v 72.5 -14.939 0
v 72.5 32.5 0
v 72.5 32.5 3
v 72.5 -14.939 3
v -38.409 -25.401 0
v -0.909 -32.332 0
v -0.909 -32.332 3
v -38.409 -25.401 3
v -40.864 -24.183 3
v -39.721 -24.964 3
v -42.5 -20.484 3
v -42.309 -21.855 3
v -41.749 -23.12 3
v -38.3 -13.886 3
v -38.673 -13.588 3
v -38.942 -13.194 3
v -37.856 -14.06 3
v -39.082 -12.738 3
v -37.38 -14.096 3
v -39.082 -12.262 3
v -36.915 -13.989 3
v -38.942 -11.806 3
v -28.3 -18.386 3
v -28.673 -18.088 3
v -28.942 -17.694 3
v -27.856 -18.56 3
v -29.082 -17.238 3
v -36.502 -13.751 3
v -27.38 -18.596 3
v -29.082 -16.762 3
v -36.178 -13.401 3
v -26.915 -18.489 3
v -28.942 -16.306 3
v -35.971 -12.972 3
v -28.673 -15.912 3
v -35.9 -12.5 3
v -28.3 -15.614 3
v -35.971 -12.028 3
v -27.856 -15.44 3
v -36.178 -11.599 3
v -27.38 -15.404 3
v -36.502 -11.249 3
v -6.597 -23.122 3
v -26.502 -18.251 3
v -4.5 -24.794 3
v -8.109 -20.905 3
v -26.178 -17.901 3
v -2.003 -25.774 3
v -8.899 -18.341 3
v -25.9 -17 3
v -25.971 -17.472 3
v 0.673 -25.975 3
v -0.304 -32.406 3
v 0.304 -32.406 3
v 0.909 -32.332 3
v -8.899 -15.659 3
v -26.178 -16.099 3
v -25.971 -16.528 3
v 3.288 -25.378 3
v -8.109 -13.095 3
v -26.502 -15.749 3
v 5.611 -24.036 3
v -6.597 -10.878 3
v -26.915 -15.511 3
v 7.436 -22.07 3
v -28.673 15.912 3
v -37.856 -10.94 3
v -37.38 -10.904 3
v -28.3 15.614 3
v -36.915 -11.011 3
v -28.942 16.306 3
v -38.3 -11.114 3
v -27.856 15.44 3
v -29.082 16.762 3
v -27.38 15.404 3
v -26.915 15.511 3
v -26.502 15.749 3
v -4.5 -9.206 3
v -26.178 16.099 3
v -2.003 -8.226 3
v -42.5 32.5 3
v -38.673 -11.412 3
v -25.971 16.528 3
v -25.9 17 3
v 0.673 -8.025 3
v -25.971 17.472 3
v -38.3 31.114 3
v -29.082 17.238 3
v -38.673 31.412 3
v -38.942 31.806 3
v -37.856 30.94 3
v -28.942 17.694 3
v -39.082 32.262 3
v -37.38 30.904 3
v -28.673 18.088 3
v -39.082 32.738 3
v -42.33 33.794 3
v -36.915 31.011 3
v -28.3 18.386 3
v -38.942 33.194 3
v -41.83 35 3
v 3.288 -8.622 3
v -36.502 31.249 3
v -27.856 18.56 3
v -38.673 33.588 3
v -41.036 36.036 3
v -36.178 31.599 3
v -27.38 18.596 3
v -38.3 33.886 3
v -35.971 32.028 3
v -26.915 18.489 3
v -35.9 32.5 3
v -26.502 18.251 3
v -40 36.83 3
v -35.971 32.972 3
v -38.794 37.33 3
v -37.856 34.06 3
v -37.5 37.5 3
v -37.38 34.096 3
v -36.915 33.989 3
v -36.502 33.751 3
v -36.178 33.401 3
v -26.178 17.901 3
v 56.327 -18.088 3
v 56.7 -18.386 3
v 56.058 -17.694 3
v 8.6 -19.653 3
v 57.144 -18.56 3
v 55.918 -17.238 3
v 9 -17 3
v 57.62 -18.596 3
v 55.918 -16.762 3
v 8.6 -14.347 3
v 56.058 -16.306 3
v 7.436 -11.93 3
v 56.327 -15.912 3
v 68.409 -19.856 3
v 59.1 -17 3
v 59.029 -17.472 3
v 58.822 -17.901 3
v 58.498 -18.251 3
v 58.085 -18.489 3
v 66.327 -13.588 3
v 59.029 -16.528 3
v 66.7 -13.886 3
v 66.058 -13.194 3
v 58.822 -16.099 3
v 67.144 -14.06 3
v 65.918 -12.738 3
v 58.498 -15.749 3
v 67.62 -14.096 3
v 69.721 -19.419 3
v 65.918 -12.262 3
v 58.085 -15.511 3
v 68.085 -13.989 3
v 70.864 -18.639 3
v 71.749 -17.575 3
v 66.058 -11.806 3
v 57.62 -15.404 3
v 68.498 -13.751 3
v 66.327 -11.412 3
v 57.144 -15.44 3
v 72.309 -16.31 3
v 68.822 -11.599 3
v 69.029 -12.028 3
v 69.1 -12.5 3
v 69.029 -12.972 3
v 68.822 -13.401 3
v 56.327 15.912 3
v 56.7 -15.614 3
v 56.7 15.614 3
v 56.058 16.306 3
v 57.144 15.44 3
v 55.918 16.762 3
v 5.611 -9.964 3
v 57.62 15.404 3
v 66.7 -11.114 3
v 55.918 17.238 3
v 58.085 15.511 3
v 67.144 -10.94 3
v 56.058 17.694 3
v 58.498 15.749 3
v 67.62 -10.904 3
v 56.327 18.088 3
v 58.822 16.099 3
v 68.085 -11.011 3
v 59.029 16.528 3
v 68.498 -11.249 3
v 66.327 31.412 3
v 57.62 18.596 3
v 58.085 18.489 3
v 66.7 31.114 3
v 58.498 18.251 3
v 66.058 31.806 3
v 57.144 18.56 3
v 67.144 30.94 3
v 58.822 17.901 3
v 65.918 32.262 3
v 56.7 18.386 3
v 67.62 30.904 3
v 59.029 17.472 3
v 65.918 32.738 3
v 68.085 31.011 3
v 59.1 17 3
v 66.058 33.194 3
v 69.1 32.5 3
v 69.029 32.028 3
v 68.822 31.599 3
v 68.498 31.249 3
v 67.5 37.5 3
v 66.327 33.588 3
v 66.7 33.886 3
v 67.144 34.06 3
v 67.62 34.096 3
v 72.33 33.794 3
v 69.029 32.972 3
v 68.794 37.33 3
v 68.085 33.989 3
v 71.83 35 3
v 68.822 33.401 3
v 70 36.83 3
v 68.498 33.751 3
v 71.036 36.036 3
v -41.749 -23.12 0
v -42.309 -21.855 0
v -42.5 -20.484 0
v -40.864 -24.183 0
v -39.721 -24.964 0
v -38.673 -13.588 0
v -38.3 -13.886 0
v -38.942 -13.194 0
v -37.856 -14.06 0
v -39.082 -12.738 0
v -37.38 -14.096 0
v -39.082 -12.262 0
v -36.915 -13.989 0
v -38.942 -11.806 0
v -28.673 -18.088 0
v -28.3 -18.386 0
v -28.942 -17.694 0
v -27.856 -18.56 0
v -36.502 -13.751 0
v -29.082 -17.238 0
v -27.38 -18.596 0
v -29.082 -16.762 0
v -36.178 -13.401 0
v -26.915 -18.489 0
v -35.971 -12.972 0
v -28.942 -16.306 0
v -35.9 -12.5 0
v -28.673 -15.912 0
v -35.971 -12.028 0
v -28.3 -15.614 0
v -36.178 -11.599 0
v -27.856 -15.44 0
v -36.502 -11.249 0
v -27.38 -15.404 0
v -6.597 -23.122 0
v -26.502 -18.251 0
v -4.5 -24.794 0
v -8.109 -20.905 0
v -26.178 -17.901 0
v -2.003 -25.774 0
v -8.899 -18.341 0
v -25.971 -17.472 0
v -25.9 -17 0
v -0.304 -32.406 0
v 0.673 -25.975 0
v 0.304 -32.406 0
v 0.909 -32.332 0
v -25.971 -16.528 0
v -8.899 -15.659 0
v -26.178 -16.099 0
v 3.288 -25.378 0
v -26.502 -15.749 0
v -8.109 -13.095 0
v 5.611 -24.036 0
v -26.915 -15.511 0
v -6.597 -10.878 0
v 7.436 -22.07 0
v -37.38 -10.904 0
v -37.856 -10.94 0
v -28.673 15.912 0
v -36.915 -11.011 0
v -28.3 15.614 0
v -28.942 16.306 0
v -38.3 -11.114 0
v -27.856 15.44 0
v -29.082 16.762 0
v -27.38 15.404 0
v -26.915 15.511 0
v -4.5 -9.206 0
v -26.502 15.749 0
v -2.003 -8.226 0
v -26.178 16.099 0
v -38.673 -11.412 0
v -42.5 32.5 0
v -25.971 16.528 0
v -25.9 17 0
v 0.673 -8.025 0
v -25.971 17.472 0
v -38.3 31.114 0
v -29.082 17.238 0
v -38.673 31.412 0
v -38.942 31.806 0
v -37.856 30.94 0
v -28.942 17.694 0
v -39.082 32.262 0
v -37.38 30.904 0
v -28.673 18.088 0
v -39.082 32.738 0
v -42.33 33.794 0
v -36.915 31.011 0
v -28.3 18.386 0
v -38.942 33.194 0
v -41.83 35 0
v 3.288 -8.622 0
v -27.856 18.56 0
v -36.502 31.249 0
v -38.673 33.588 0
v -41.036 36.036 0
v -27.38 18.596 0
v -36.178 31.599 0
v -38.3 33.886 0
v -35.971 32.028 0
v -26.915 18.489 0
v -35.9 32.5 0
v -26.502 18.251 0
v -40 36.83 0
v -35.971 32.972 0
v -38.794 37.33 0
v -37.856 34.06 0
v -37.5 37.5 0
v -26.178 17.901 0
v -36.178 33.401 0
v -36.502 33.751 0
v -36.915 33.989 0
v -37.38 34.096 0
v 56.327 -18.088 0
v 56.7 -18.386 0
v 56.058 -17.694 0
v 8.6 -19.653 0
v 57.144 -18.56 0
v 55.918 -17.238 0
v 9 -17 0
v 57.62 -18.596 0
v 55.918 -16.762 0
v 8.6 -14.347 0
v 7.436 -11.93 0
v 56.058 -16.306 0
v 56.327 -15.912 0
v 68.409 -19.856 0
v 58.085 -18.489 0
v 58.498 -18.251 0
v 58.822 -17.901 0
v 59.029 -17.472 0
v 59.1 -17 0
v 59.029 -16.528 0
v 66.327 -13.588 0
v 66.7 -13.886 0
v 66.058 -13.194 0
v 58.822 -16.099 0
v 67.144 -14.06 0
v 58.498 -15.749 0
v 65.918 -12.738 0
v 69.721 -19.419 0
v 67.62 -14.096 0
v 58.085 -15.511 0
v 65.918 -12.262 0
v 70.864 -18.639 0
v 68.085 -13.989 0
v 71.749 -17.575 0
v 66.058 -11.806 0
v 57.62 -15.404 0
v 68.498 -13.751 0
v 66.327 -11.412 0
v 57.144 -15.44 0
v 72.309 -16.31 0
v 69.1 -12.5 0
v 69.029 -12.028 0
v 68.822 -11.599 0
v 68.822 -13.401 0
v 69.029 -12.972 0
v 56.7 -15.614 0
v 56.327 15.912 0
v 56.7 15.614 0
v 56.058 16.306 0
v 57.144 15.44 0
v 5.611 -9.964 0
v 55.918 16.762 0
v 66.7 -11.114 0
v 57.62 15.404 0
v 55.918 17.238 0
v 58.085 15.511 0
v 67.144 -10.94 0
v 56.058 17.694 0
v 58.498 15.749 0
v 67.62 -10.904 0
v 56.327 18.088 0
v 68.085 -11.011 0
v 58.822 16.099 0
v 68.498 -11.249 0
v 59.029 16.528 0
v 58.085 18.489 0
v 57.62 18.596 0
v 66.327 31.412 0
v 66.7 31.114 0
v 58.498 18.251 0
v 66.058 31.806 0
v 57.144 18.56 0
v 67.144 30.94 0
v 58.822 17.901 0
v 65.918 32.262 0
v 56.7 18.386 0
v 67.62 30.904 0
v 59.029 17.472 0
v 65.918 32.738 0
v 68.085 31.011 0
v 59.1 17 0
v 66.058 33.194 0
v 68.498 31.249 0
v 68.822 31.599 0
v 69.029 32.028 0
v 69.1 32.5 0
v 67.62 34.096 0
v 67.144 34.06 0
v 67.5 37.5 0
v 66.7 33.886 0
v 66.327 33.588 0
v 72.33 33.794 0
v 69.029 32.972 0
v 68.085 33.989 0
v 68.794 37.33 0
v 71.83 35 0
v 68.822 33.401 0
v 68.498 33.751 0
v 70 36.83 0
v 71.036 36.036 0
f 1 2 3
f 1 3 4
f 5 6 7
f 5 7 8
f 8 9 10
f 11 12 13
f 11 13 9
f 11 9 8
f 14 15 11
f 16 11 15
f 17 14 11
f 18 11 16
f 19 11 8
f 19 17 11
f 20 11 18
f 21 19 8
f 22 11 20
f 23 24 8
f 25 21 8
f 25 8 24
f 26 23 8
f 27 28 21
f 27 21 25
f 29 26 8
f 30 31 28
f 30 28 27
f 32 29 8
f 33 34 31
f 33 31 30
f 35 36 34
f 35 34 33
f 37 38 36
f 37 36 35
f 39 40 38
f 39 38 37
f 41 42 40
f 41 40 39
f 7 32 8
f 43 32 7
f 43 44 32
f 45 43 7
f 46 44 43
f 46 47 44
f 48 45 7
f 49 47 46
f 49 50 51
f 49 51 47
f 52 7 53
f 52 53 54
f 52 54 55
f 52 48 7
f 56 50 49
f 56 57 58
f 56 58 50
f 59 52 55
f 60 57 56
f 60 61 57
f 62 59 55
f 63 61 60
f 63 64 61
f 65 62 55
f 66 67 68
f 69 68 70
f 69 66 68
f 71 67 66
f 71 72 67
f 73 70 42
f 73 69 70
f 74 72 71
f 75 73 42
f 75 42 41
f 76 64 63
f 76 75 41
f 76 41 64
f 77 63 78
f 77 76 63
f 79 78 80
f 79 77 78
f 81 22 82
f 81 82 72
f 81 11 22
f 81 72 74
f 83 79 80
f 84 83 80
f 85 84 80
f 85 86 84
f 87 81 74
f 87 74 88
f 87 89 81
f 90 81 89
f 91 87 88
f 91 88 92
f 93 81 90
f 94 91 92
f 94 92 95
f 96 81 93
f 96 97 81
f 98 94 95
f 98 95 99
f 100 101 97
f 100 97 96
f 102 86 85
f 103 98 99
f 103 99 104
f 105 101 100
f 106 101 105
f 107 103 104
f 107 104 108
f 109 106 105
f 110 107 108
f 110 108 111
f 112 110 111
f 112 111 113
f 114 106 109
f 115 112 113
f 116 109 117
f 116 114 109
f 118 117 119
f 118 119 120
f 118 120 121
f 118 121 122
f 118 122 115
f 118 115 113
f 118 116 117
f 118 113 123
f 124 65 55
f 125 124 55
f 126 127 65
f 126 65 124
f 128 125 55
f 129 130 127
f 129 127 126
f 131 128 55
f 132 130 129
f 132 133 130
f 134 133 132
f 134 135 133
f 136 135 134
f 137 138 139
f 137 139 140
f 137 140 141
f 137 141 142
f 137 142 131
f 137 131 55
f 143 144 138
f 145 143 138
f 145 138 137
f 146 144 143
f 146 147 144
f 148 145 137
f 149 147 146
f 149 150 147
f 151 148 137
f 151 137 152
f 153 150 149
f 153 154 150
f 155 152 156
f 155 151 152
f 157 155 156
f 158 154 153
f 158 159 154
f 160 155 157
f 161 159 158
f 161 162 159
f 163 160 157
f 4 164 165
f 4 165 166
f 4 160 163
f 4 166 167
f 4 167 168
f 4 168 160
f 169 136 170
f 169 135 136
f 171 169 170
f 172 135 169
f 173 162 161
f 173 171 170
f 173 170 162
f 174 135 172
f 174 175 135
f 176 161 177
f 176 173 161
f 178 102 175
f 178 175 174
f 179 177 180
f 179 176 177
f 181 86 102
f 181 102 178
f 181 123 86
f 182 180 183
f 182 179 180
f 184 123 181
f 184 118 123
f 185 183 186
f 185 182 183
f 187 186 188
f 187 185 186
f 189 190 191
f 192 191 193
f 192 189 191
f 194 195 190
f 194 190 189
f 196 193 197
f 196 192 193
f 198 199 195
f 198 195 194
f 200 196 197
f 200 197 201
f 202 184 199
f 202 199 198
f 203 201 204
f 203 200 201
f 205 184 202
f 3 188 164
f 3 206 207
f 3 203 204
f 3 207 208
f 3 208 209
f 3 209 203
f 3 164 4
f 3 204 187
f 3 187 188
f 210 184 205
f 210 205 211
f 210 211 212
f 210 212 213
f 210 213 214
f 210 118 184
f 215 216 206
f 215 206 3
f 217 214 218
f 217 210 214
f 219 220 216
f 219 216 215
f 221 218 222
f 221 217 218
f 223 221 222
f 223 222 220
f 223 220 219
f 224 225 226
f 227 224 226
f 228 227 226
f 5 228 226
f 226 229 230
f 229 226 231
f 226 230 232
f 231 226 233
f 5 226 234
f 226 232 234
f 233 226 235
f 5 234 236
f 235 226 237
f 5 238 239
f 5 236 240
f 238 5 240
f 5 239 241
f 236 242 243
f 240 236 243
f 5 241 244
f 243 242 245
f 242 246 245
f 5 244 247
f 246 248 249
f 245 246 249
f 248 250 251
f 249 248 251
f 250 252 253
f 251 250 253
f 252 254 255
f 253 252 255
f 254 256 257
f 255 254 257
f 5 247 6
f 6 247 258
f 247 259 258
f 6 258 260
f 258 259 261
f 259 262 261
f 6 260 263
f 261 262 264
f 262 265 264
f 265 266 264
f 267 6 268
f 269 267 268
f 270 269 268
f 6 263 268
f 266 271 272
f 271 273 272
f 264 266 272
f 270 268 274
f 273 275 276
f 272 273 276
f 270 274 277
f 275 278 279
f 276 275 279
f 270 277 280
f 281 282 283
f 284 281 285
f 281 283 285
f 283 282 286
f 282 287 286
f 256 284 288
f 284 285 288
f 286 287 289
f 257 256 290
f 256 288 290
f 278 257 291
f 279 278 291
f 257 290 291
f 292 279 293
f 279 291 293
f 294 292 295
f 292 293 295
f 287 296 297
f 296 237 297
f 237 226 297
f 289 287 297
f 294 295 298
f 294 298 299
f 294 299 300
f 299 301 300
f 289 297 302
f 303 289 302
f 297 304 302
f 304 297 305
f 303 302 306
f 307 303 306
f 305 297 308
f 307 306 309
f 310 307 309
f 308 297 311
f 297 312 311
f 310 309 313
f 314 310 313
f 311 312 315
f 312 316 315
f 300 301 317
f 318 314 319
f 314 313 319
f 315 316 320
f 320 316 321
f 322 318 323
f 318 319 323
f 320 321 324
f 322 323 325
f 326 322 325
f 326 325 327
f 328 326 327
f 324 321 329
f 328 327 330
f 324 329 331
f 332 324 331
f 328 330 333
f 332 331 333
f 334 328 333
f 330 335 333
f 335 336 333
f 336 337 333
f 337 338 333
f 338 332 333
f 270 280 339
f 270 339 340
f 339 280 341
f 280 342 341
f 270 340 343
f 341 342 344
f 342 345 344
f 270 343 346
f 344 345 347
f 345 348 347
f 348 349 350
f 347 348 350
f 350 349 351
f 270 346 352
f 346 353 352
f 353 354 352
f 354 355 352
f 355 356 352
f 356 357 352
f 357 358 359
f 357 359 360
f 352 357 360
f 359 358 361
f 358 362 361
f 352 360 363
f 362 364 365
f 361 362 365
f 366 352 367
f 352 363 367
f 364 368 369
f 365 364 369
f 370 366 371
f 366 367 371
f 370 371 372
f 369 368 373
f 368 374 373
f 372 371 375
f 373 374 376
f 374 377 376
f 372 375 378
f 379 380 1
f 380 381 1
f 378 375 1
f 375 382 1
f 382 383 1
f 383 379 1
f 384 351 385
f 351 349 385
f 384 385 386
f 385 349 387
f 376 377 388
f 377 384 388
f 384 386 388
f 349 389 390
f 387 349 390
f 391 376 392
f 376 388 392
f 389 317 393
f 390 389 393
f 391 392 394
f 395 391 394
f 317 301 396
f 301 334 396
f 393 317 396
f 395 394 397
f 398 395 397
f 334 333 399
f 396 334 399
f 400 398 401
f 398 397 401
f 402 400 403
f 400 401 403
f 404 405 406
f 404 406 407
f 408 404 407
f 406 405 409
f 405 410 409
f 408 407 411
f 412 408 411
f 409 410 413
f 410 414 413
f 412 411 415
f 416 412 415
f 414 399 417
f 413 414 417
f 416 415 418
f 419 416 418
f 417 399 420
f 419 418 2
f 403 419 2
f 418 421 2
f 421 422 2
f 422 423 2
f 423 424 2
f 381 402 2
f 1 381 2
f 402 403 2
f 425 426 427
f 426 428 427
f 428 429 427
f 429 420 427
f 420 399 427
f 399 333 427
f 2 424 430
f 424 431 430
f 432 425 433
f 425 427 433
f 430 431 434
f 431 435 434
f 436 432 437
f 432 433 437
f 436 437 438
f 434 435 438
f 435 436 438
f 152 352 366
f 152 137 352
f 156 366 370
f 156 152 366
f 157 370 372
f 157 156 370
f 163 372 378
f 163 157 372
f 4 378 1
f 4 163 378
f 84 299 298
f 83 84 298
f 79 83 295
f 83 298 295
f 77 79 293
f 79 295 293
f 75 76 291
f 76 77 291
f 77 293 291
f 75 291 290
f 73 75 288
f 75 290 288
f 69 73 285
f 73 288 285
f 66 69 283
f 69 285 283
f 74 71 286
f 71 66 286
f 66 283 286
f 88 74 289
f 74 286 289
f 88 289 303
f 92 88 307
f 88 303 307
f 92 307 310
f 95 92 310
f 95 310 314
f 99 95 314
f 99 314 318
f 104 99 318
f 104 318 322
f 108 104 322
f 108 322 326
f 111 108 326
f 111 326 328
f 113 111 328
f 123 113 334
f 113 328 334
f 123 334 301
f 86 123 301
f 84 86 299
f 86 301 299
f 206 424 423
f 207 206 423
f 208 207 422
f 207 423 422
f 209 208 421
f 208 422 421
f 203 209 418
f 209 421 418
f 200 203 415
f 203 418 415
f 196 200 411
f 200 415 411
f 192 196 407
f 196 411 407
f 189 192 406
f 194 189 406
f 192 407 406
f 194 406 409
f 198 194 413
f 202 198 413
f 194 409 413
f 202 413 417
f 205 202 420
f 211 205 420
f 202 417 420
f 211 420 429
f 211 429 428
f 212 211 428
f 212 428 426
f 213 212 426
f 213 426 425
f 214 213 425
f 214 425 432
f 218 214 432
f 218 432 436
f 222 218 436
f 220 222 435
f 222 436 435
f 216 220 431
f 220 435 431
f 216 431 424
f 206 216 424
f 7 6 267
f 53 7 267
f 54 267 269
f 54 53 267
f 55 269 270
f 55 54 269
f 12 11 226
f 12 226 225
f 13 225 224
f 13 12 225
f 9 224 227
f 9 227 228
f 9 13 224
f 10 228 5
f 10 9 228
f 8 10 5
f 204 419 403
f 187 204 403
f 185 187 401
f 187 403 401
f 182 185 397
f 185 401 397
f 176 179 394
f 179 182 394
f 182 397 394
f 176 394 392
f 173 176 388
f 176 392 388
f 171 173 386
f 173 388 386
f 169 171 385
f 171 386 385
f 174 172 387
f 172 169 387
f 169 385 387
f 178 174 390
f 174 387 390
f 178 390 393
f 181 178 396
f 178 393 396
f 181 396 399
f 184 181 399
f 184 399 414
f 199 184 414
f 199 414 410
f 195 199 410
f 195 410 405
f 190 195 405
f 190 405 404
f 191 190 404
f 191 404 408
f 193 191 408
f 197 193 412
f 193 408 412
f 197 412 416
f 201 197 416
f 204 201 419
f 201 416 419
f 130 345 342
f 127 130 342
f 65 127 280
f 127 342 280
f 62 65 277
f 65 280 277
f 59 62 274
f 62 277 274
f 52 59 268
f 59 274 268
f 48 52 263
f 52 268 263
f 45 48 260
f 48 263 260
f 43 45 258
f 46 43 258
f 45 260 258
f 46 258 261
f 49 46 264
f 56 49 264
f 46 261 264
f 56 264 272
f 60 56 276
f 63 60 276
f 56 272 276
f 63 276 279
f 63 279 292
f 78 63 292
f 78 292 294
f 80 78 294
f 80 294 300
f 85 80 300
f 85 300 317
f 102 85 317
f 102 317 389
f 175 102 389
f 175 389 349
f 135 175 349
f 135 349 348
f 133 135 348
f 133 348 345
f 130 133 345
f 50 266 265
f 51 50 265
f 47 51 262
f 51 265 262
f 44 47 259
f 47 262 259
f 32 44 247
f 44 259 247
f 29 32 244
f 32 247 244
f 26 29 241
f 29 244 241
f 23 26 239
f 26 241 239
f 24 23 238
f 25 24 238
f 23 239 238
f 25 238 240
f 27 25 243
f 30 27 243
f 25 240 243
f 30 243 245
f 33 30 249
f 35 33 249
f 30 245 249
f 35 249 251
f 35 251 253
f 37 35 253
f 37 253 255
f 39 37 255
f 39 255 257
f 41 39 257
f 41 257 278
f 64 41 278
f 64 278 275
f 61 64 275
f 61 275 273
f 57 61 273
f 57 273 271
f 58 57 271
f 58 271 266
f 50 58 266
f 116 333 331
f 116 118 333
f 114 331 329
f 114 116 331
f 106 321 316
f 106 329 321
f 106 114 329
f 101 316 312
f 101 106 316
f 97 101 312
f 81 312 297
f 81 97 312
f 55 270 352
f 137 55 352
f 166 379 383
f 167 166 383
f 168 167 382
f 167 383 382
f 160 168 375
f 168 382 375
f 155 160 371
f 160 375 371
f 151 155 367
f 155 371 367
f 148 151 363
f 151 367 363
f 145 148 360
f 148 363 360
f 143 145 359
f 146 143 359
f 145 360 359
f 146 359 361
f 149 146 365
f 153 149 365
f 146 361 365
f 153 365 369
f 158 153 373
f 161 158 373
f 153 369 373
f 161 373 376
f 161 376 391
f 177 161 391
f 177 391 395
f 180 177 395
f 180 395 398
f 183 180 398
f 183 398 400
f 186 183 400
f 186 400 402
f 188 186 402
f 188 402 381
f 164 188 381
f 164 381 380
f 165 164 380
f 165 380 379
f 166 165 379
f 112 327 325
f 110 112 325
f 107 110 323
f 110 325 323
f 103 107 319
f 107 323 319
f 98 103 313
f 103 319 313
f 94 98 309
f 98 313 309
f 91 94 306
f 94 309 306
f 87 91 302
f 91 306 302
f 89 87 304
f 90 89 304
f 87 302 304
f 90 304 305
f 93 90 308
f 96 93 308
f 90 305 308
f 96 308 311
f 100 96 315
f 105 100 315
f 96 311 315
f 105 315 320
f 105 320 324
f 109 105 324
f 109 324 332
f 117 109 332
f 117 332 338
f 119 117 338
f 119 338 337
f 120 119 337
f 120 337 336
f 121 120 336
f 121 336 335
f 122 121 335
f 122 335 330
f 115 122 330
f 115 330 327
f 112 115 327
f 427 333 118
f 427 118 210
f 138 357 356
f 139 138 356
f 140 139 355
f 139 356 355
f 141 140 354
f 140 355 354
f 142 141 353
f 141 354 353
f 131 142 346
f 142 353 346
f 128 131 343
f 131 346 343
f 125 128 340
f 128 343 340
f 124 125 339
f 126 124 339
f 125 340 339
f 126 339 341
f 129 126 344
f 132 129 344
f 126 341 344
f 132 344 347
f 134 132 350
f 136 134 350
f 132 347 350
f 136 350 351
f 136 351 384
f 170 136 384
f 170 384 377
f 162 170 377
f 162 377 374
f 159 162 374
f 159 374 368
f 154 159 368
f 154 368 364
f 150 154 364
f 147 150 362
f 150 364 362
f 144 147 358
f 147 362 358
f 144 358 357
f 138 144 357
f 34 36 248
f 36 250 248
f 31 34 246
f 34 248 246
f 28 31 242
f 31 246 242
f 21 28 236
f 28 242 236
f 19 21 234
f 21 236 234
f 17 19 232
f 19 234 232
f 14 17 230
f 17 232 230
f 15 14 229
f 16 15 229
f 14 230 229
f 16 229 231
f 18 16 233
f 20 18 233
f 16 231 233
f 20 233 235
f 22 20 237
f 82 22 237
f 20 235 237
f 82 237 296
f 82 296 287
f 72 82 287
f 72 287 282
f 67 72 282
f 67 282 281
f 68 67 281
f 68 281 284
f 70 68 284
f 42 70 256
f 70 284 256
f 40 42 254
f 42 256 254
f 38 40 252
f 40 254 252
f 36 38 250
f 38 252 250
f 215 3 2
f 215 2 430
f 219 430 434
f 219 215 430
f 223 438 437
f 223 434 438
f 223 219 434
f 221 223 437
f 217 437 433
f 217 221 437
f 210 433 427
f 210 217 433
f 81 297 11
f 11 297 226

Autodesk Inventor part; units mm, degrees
ref_plane "YZ Plane" through (0, 0, 0) normal (1, 0, 0) x (0, 1, 0)
ref_plane "XZ Plane" through (0, 0, 0) normal (0, 1, 0) x (-1, 0, 0)
ref_plane "XY Plane" through (0, 0, 0) normal (0, 0, 1) x (1, 0, 0)
sketch "スケッチ1" plane through (0, 0, 0) normal (0, 0, 1) x (1, 0, 0)
  point P0 (0, 0)
sketch "スケッチ2" plane through (0, 0, 0) normal (0, 0, 1) x (1, 0, 0)
  line L0 (72.5, -37.5) -> (-72.5, -37.5)
  line L1 (-72.5, -37.5) -> (-72.5, 37.5)
  line L2 (-72.5, 37.5) -> (72.5, 37.5)
  line L3 (72.5, 37.5) -> (72.5, -37.5)
  line L4 (72.5, -37.5) -> (-72.5, 37.5) construction
  line L5 (-72.5, -37.5) -> (72.5, 37.5) construction
  line L6 (67.5, 32.5) -> (-67.5, 32.5)
  line L7 (-67.5, 32.5) -> (-67.5, -32.5)
  line L8 (-67.5, -32.5) -> (67.5, -32.5)
  line L9 (67.5, -32.5) -> (67.5, 32.5)
  line L10 (-67.5, 32.5) -> (-67.5, 12.5) construction
  line L11 (-69.1, 32.5) -> (-69.1, 12.5)
  line L12 (-65.9, 12.5) -> (-65.9, 32.5)
  arc A0 (-65.9, 32.5) -> (-69.1, 32.5) centre (-67.5, 32.5) ccw
  arc A1 (-69.1, 12.5) -> (-65.9, 12.5) centre (-67.5, 12.5) ccw
  line L13 (-67.5, 32.5) -> (-47.5, 32.5) construction
  line L14 (-67.5, -32.5) -> (-67.5, -12.5) construction
  line L15 (-65.9, -32.5) -> (-65.9, -12.5)
  line L16 (-69.1, -12.5) -> (-69.1, -32.5)
  arc A2 (-69.1, -32.5) -> (-65.9, -32.5) centre (-67.5, -32.5) ccw
  arc A3 (-65.9, -12.5) -> (-69.1, -12.5) centre (-67.5, -12.5) ccw
  line L17 (-67.5, -32.5) -> (-47.5, -32.5) construction
  line L18 (67.5, 32.5) -> (67.5, 12.5) construction
  line L19 (65.9, 32.5) -> (65.9, 12.5)
  line L20 (69.1, 12.5) -> (69.1, 32.5)
  arc A4 (69.1, 32.5) -> (65.9, 32.5) centre (67.5, 32.5) ccw
  arc A5 (65.9, 12.5) -> (69.1, 12.5) centre (67.5, 12.5) ccw
  line L21 (67.5, 32.5) -> (87.5, 32.5) construction
  line L22 (67.5, -32.5) -> (67.5, -12.5) construction
  line L23 (69.1, -32.5) -> (69.1, -12.5)
  line L24 (65.9, -12.5) -> (65.9, -32.5)
  arc A6 (65.9, -32.5) -> (69.1, -32.5) centre (67.5, -32.5) ccw
  arc A7 (69.1, -12.5) -> (65.9, -12.5) centre (67.5, -12.5) ccw
  line L25 (67.5, -32.5) -> (87.5, -32.5) construction
  line L26 (-72.5, -17) -> (72.5, -17)
  circle A8 centre (0, -17) radius 9
  circle A9 centre (0, -17) radius 39
  line L27 (0, 37.5) -> (0, -37.5)
  line L28 (-57.5, 37.5) -> (60, 37.5)
  line L29 (60, 37.5) -> (60, 32.5)
  line L30 (60, 32.5) -> (-60, 32.5)
  circle A10 centre (0, -155) radius 120
  circle A11 centre (-67.5, 32.5) radius 1.6
  circle A12 centre (-67.5, -12.5) radius 1.6
  circle A13 centre (67.5, 32.5) radius 1.6
  circle A14 centre (67.5, -12.5) radius 1.6
  circle A15 centre (-57.5, -17) radius 1.6
  circle A16 centre (-57.5, 17) radius 1.6
  circle A17 centre (57.5, -17) radius 1.6
  circle A18 centre (57.5, 17) radius 1.6
  line L31 (0, -32.5) -> (-72.5, -19.1)
  line L32 (0, -32.5) -> (72.5, -19.1)
  line L33 (67.5, -19.1) -> (-67.5, -19.1)
  circle A19 centre (-37.5, 32.5) radius 1.6
  circle A20 centre (-27.5, 17) radius 1.6
  circle A21 centre (-37.5, -12.5) radius 1.6
  circle A22 centre (-27.5, -17) radius 1.6
  line L34 (-42.5, 37.5) -> (-42.5, -37.5)
  point P0 (0, 0)
  point P1 (-67.5, 22.5)
  point P2 (67.5, 22.5)
  point P3 (60, 37.5)
  point P4 (-24.367, -37.5)
  point P5 (24.367, -37.5)
  point P6 (-65.9, 32.5)
  point P7 (69.1, -12.5)
  point P8 (65.9, 32.5)
  point P9 (69.1, 32.5)
  point P10 (-65.9, -12.5)
  point P11 (-35.7876, -32.5)
  point P12 (35.7876, -32.5)
  point P13 (0, 0)
  point P14 (72.5, -19.1)
  point P15 (-65.9, 32.5)
  point P16 (65.9, 32.5)
  point P17 (80, 36.6)
  point P18 (-65.9, 32.5)
  point P19 (65.9, 32.5)
  point P20 (67.5, 30.9)
  point P21 (-67.5, 30.9)
  point P22 (67.5, 10.9)
  point P23 (-67.5, 10.9)
  point P24 (-33.1776, -37.5)
  point P25 (33.1776, -37.5)
  point P26 (-42.5, 37.5)
  point P27 (-42.5, -24.6448)
  dimension "d0" = 145
  dimension "d1" = 75
  dimension "d21" = 5
  dimension "d22" = 20
  dimension "d23" = 90
  dimension "d24" = 3.2
  dimension "d25" = 20
  dimension "d26" = 90
  dimension "d27" = 3.2
  dimension "d28" = 20
  dimension "d29" = 90
  dimension "d30" = 3.2
  dimension "d31" = 20
  dimension "d32" = 90
  dimension "d33" = 3.2
  dimension "d36" = 20.5
  dimension "d37" = 18
  dimension "d38" = 78
  dimension "d42" = 120
  dimension "d43" = 60
  dimension "d45" = 240
  dimension "d46" = 138
  dimension "d47" = 3.2
  dimension "d48" = 10
  dimension "d49" = 3.2
  dimension "d50" = 10
  dimension "d51" = 17
  dimension "d52" = 17
  dimension "d54" = 5
  dimension "d57" = 30
  dimension "d62" = 30
extrude "押し出し1" add sketch "スケッチ2" along normal blind 3 contours L34 L33 A9 L31 | L31 A9 L33 A8 L27 | L27 A8 L33 A9 L32 | L34 L26 A9 L33 | A9 L33 L24 L32 | A9 L26 A22 A8 L33 | L34 L6 A19 L27 A9 A21 L26 | A8 L26 A9 L33 | A9 L26 A17 L24 L33 | L24 L33 L9 L32 | A9 A21 L27 A8 L26 A22 | L34 L2 L27 L6 A19 | A8 L27 A9 L26 | A9 L27 L6 L19 A5 L9 A7 L24 L26 A17 | L24 L26 L9 L33 | L9 L26 L23 L32 | L32 L23 L26 L3 | L2 L29 L6 L27 | L24 A14 L9 L26 | L26 L23 A7 L9 A5 L20 A4 L6 L29 L2 L3 | L26 L9 A14 L23 | A13 L9 A5 L19 | L9 A13 L20 A5
fillet "フィレット1" radius 5 5 edges at (72.5, 37.5, 1.5) (72.5, -19.1, 1.5) (0, -32.5, 1.5) (-42.5, -24.6448, 1.5) (-42.5, 37.5, 1.5)
sketch "スケッチ4" plane through (0, 0, 0) normal (0, 0, -1) x (-1, 0, 0)
  circle A0 centre (-57.5, -17) radius 1.6 projected
  circle A1 centre (-57.5, 17) radius 1.6 projected
  circle A2 centre (-67.5, 32.5) radius 1.6 projected
  circle A3 centre (-67.5, -12.5) radius 1.6 projected
  line L0 (-72.5, -14.9395) -> (-72.5, 32.5) projected
  line L1 (-67.5, 37.5) -> (37.5, 37.5) projected
  arc A4 (-67.5, 37.5) -> (-72.5, 32.5) centre (-67.5, 32.5) ccw projected
  line L2 (42.5, 32.5) -> (42.5, -20.4843) projected
  arc A5 (-0.9087, -32.332) -> (0.9087, -32.332) centre (0, -27.4153) ccw projected
  line L3 (38.4087, -25.401) -> (0.9087, -32.332) projected
  arc A6 (-72.5, -14.9395) -> (-68.4087, -19.8562) centre (-67.5, -14.9395) ccw projected
  line L4 (-0.9087, -32.332) -> (-68.4087, -19.8562) projected
  arc A7 (42.5, 32.5) -> (37.5, 37.5) centre (37.5, 32.5) ccw projected
  arc A8 (38.4087, -25.401) -> (42.5, -20.4843) centre (37.5, -20.4843) ccw projected
  point P0 (0, 0)
equation "\"d25\" = d22"
equation "\"d27\" = d24"
equation "\"d28\" = d22"
equation "\"d30\" = d24"
equation "\"d31\" = d22"
equation "\"d33\" = d24"
equation "\"d43\" = 0.5 * d42"
properties part number "small_plate_nomotor"
